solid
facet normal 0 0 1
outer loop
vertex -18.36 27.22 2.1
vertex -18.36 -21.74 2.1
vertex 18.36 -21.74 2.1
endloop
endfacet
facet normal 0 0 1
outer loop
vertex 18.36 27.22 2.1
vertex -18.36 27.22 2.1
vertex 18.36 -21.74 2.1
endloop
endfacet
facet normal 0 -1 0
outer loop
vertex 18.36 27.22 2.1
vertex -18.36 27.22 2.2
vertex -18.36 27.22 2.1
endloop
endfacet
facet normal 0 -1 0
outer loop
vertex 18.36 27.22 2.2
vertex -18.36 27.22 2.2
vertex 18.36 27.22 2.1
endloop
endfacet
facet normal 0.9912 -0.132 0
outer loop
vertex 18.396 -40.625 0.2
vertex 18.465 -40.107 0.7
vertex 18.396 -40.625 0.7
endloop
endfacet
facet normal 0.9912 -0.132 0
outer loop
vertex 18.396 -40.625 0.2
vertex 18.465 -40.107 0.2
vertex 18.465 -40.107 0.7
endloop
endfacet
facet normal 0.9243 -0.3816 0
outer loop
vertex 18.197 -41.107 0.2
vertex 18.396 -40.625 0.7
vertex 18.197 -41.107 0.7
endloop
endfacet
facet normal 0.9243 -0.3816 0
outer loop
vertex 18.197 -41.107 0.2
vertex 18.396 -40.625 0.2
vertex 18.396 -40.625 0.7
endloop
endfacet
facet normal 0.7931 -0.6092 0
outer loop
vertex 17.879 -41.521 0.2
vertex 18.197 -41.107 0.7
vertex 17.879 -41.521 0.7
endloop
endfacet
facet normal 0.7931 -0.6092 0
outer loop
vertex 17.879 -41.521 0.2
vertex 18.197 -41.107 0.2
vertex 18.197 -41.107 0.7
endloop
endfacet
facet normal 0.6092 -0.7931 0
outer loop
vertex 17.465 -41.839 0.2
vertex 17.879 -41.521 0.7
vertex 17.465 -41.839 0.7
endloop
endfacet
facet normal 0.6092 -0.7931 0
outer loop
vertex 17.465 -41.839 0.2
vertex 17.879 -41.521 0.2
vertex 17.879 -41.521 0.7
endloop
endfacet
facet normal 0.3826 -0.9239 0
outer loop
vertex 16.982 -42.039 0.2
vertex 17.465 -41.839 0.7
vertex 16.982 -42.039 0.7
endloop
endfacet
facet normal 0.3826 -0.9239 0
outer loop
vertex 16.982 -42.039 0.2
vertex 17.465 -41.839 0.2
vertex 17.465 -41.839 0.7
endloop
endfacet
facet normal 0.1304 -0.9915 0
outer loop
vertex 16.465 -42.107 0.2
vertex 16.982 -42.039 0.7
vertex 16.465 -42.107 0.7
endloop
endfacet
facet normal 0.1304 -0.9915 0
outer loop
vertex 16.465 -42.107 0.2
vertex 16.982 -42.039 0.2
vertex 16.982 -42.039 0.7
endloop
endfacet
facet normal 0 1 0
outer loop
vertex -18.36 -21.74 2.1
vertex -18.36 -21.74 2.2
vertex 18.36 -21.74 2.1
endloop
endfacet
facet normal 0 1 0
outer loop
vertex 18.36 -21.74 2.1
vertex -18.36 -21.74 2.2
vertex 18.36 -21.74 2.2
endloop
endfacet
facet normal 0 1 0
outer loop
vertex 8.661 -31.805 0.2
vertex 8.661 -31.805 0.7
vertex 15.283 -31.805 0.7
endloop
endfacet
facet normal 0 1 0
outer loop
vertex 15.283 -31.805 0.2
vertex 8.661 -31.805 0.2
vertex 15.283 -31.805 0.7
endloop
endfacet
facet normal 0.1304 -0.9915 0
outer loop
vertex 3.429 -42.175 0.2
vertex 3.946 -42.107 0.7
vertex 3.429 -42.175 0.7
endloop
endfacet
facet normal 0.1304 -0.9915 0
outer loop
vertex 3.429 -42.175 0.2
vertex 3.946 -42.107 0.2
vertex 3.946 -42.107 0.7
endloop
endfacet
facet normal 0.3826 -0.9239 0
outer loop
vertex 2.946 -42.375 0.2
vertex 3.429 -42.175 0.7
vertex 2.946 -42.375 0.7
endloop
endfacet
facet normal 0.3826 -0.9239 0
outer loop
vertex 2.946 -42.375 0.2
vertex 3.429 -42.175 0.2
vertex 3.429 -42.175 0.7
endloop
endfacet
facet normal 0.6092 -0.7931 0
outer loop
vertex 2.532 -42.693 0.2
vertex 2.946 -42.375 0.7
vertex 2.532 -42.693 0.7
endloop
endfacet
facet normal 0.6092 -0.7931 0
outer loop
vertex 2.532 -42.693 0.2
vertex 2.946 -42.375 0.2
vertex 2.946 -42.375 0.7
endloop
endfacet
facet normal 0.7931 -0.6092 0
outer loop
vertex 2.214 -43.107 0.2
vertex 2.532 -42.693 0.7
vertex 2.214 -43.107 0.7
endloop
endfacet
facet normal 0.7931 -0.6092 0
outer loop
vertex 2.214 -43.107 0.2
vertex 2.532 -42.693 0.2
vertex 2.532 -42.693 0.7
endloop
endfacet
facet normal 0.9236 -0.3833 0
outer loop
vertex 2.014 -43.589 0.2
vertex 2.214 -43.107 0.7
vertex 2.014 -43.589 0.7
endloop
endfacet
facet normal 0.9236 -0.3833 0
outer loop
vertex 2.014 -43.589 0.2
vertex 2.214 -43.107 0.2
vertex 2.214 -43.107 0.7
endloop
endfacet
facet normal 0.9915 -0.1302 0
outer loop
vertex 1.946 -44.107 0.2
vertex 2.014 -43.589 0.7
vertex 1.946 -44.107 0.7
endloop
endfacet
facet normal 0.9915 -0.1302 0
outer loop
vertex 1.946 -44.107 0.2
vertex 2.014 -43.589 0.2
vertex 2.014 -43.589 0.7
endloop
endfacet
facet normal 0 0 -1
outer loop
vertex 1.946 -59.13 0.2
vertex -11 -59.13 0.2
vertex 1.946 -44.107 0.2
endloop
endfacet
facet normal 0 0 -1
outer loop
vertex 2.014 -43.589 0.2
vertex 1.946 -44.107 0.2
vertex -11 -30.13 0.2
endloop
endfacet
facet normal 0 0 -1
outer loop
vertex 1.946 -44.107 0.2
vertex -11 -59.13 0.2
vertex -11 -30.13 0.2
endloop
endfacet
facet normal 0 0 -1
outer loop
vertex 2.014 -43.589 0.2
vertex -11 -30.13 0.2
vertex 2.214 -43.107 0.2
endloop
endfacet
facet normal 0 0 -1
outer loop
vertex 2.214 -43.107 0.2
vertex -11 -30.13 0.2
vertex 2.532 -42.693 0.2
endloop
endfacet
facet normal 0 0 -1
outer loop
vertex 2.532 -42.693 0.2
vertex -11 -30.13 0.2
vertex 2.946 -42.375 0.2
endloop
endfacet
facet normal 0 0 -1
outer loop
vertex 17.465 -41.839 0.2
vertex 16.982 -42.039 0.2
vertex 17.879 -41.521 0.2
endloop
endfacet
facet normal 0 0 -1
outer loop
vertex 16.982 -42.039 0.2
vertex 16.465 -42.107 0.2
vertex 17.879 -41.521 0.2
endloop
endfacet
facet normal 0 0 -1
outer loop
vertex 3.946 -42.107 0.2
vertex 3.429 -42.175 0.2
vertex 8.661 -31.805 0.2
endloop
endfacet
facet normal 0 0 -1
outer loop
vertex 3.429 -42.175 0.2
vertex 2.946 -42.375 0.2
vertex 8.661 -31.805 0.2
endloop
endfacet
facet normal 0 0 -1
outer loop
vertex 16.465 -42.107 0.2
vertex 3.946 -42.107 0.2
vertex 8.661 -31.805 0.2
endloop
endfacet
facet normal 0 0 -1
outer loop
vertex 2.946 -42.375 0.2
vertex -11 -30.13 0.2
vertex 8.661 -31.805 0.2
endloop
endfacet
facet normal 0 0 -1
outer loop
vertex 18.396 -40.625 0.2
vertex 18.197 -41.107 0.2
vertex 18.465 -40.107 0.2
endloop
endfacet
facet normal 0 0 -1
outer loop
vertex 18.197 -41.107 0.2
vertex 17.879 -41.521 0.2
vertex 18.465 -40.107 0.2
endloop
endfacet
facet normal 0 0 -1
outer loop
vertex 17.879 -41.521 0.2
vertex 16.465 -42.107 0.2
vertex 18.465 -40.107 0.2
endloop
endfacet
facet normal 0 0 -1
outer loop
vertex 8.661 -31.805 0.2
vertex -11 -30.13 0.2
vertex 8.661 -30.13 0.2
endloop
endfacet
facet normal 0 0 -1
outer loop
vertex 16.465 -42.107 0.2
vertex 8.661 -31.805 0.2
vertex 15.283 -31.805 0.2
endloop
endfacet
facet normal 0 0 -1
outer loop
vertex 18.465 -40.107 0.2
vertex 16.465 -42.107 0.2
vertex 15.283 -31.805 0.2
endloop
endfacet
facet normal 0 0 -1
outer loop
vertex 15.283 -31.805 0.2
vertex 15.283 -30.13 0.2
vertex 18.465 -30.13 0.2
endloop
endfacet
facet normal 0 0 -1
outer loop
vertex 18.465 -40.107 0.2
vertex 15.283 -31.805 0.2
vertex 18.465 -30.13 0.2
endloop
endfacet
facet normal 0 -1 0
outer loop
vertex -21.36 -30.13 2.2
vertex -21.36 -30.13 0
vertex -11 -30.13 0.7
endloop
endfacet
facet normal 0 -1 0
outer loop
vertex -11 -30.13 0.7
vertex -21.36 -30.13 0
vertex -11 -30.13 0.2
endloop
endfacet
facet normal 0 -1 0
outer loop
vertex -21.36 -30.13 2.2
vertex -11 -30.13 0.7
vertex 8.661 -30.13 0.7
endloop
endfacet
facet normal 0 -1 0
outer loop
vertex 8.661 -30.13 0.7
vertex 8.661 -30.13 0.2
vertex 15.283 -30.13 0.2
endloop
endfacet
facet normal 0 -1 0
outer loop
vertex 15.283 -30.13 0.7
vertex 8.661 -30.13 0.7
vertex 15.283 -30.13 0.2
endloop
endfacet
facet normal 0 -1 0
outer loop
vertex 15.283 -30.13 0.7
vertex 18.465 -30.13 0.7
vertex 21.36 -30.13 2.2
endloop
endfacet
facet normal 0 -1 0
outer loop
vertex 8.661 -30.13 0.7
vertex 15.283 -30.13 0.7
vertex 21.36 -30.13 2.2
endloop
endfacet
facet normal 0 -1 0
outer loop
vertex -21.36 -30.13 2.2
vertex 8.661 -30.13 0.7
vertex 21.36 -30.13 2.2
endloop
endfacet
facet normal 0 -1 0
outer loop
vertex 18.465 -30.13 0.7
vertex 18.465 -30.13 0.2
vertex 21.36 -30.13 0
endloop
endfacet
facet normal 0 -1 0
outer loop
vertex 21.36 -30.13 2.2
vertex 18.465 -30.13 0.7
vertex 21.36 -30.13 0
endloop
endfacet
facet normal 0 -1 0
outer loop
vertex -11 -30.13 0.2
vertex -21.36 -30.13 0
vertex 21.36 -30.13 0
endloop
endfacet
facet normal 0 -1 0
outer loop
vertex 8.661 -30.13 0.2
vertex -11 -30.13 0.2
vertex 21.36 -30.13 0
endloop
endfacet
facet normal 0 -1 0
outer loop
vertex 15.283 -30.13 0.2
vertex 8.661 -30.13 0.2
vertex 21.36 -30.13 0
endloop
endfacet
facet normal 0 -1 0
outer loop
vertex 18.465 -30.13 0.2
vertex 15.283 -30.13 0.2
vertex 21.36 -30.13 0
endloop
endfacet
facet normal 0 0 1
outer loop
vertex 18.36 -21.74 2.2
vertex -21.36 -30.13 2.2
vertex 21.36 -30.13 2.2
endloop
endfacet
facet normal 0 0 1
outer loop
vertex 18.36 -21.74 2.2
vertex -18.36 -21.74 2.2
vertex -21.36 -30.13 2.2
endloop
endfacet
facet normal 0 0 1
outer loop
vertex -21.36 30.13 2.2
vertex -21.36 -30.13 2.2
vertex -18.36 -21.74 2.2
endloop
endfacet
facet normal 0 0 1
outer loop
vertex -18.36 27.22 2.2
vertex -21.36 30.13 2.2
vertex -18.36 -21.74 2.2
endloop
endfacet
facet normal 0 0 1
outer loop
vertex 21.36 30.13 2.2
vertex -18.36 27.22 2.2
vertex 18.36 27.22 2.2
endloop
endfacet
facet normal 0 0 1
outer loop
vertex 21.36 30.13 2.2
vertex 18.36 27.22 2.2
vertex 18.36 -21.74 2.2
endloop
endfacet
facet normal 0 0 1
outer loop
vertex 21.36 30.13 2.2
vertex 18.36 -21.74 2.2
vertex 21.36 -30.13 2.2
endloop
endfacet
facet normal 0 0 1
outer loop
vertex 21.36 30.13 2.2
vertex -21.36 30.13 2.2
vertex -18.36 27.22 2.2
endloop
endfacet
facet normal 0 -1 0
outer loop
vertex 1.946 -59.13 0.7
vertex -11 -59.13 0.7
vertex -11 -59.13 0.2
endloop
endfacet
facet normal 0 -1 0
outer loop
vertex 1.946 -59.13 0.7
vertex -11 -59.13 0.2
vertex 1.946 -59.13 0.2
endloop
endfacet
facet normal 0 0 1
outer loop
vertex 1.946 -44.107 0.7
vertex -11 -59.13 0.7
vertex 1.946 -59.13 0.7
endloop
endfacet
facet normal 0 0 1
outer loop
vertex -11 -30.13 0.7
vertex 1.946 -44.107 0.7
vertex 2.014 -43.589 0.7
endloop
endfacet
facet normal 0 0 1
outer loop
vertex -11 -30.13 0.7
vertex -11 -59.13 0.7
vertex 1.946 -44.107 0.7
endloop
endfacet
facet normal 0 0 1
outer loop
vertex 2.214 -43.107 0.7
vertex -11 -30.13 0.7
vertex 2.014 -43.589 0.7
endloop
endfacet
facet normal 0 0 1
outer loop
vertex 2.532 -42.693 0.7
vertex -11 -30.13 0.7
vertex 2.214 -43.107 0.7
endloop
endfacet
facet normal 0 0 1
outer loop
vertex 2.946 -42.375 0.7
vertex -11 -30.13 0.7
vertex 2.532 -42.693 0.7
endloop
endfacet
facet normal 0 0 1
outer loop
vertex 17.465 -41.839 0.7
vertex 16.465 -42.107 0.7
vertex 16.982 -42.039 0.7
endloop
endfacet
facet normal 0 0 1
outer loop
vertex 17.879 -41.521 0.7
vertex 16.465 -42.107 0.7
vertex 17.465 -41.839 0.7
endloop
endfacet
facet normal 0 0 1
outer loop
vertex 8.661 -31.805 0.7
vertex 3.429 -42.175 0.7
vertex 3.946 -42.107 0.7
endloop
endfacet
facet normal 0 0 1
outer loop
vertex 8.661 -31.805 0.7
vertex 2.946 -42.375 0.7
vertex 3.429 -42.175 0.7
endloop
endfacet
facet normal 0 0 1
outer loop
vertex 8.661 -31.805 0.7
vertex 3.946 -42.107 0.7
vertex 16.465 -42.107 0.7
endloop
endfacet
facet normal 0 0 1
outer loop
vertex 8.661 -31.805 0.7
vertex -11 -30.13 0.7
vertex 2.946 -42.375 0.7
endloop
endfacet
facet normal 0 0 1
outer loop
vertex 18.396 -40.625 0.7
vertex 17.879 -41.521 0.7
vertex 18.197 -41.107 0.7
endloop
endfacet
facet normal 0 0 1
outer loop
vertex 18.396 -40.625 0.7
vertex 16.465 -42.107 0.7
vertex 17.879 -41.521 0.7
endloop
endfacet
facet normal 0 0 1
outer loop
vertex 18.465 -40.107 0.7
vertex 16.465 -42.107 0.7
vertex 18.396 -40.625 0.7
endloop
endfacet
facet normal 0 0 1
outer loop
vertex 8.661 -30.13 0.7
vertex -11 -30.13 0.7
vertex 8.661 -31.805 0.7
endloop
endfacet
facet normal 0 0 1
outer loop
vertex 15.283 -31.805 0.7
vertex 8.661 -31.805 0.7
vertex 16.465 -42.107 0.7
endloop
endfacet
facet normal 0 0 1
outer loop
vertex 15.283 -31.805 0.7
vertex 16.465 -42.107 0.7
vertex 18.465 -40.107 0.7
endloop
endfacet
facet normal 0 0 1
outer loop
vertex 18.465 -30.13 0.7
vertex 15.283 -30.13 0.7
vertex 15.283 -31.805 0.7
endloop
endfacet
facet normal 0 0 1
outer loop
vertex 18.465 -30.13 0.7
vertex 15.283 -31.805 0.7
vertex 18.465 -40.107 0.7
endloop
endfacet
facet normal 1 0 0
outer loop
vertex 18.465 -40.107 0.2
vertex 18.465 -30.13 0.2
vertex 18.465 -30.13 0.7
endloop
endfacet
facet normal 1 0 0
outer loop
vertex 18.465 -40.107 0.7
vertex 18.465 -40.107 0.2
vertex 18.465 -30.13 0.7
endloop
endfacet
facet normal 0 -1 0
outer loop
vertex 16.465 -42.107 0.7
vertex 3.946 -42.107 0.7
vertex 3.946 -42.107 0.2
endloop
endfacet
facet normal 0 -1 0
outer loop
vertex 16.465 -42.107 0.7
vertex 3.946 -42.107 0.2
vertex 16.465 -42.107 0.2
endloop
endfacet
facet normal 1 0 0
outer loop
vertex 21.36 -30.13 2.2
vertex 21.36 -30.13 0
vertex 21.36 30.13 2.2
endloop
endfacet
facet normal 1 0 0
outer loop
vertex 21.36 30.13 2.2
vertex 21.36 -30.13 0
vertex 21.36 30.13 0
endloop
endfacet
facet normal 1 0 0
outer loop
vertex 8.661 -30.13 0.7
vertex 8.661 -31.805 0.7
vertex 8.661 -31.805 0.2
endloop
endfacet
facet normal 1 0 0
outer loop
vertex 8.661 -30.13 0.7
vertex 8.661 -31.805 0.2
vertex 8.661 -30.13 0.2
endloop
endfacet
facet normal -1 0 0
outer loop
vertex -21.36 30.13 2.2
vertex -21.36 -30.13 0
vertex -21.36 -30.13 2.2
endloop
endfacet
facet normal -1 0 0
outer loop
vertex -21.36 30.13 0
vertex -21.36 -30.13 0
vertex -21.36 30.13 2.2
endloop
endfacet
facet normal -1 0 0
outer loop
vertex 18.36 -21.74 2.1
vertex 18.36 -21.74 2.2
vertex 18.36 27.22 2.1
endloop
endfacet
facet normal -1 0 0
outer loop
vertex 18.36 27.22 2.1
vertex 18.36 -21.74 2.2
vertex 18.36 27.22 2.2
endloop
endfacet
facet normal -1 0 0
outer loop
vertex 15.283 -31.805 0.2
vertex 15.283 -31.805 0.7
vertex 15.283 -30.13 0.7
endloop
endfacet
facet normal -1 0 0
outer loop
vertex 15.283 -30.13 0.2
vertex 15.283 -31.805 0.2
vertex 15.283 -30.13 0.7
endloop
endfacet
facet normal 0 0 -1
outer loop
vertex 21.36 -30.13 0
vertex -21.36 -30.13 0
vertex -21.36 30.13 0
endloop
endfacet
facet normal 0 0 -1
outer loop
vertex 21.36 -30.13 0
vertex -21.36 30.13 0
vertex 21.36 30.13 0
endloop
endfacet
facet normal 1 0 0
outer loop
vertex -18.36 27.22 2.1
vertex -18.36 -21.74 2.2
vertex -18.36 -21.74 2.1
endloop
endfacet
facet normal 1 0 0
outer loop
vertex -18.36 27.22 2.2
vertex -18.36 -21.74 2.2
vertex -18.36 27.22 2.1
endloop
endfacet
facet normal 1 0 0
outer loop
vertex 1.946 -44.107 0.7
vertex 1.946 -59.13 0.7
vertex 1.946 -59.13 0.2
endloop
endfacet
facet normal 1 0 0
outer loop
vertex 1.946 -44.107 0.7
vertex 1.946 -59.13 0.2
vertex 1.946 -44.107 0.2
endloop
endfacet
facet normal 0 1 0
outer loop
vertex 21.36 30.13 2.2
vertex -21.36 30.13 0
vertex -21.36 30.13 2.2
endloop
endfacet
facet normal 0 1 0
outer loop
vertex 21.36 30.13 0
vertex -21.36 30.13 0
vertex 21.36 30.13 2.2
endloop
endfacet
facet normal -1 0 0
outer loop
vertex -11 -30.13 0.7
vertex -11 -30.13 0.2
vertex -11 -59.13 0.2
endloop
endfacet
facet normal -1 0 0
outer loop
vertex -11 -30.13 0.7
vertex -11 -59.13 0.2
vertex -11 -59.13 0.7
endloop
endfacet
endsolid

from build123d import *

# Parameters (mm, degrees)
SKETCH_1_W          = 42.72
SKETCH_1_H          = 60.26
EXTRUDE_1_DEPTH     = 2.2
SKETCH_2_W          = 36.72
SKETCH_2_H          = 48.96
CUT_EXTRUDE_1_DEPTH = 0.1
SKETCH_3_W          = 29.464595321
SKETCH_3_H          = 0.5
EXTRUDE_1004_DEPTH  = 29
SKETCH_4_W          = 16.518374104
SKETCH_4_H          = 17.022875601
SKETCH_4_W_2        = 6.622613049
SKETCH_4_H_2        = 1.675281879
CUT_EXTRUDE_2_DEPTH = 44.9
FILLET_1_R          = 2


with BuildPart() as part:
    # Sketch 1 → Extrude 1 (new body)
    with BuildSketch(Plane.XY):
        Rectangle(SKETCH_1_W, SKETCH_1_H)
    extrude(amount=EXTRUDE_1_DEPTH)

    # Sketch 2 → Cut-Extrude 1 (cut)
    with BuildSketch(Plane.XY.offset(2.2)):
        with Locations((0, 2.74)):
            Rectangle(SKETCH_2_W, SKETCH_2_H)
    extrude(amount=-CUT_EXTRUDE_1_DEPTH, mode=Mode.SUBTRACT)

    # Sketch 3 → Extrude 1004 (add)
    with BuildSketch(Plane.XZ.offset(30.13)):
        with Locations((3.732297661, 0.45)):
            Rectangle(SKETCH_3_W, SKETCH_3_H)
    extrude(amount=EXTRUDE_1004_DEPTH)

    # Sketch 4 → Cut-Extrude 2 (cut)
    with BuildSketch(Plane.XY.offset(0.7)):
        with Locations((10.205408269, -50.6185622)):
            Rectangle(SKETCH_4_W, SKETCH_4_H)
        with Locations((11.972121528, -30.96764094)):
            Rectangle(SKETCH_4_W_2, SKETCH_4_H_2)
    extrude(amount=-CUT_EXTRUDE_2_DEPTH, mode=Mode.SUBTRACT)

    # Fillet 1
    fillet_1_edges = [part.edges().sort_by_distance(p)[0] for p in [
        (1.946221217, -42.107124399, 0.45),
        (18.464595321, -42.107124399, 0.45),
    ]]
    fillet(fillet_1_edges, radius=FILLET_1_R)


solid = part.part
